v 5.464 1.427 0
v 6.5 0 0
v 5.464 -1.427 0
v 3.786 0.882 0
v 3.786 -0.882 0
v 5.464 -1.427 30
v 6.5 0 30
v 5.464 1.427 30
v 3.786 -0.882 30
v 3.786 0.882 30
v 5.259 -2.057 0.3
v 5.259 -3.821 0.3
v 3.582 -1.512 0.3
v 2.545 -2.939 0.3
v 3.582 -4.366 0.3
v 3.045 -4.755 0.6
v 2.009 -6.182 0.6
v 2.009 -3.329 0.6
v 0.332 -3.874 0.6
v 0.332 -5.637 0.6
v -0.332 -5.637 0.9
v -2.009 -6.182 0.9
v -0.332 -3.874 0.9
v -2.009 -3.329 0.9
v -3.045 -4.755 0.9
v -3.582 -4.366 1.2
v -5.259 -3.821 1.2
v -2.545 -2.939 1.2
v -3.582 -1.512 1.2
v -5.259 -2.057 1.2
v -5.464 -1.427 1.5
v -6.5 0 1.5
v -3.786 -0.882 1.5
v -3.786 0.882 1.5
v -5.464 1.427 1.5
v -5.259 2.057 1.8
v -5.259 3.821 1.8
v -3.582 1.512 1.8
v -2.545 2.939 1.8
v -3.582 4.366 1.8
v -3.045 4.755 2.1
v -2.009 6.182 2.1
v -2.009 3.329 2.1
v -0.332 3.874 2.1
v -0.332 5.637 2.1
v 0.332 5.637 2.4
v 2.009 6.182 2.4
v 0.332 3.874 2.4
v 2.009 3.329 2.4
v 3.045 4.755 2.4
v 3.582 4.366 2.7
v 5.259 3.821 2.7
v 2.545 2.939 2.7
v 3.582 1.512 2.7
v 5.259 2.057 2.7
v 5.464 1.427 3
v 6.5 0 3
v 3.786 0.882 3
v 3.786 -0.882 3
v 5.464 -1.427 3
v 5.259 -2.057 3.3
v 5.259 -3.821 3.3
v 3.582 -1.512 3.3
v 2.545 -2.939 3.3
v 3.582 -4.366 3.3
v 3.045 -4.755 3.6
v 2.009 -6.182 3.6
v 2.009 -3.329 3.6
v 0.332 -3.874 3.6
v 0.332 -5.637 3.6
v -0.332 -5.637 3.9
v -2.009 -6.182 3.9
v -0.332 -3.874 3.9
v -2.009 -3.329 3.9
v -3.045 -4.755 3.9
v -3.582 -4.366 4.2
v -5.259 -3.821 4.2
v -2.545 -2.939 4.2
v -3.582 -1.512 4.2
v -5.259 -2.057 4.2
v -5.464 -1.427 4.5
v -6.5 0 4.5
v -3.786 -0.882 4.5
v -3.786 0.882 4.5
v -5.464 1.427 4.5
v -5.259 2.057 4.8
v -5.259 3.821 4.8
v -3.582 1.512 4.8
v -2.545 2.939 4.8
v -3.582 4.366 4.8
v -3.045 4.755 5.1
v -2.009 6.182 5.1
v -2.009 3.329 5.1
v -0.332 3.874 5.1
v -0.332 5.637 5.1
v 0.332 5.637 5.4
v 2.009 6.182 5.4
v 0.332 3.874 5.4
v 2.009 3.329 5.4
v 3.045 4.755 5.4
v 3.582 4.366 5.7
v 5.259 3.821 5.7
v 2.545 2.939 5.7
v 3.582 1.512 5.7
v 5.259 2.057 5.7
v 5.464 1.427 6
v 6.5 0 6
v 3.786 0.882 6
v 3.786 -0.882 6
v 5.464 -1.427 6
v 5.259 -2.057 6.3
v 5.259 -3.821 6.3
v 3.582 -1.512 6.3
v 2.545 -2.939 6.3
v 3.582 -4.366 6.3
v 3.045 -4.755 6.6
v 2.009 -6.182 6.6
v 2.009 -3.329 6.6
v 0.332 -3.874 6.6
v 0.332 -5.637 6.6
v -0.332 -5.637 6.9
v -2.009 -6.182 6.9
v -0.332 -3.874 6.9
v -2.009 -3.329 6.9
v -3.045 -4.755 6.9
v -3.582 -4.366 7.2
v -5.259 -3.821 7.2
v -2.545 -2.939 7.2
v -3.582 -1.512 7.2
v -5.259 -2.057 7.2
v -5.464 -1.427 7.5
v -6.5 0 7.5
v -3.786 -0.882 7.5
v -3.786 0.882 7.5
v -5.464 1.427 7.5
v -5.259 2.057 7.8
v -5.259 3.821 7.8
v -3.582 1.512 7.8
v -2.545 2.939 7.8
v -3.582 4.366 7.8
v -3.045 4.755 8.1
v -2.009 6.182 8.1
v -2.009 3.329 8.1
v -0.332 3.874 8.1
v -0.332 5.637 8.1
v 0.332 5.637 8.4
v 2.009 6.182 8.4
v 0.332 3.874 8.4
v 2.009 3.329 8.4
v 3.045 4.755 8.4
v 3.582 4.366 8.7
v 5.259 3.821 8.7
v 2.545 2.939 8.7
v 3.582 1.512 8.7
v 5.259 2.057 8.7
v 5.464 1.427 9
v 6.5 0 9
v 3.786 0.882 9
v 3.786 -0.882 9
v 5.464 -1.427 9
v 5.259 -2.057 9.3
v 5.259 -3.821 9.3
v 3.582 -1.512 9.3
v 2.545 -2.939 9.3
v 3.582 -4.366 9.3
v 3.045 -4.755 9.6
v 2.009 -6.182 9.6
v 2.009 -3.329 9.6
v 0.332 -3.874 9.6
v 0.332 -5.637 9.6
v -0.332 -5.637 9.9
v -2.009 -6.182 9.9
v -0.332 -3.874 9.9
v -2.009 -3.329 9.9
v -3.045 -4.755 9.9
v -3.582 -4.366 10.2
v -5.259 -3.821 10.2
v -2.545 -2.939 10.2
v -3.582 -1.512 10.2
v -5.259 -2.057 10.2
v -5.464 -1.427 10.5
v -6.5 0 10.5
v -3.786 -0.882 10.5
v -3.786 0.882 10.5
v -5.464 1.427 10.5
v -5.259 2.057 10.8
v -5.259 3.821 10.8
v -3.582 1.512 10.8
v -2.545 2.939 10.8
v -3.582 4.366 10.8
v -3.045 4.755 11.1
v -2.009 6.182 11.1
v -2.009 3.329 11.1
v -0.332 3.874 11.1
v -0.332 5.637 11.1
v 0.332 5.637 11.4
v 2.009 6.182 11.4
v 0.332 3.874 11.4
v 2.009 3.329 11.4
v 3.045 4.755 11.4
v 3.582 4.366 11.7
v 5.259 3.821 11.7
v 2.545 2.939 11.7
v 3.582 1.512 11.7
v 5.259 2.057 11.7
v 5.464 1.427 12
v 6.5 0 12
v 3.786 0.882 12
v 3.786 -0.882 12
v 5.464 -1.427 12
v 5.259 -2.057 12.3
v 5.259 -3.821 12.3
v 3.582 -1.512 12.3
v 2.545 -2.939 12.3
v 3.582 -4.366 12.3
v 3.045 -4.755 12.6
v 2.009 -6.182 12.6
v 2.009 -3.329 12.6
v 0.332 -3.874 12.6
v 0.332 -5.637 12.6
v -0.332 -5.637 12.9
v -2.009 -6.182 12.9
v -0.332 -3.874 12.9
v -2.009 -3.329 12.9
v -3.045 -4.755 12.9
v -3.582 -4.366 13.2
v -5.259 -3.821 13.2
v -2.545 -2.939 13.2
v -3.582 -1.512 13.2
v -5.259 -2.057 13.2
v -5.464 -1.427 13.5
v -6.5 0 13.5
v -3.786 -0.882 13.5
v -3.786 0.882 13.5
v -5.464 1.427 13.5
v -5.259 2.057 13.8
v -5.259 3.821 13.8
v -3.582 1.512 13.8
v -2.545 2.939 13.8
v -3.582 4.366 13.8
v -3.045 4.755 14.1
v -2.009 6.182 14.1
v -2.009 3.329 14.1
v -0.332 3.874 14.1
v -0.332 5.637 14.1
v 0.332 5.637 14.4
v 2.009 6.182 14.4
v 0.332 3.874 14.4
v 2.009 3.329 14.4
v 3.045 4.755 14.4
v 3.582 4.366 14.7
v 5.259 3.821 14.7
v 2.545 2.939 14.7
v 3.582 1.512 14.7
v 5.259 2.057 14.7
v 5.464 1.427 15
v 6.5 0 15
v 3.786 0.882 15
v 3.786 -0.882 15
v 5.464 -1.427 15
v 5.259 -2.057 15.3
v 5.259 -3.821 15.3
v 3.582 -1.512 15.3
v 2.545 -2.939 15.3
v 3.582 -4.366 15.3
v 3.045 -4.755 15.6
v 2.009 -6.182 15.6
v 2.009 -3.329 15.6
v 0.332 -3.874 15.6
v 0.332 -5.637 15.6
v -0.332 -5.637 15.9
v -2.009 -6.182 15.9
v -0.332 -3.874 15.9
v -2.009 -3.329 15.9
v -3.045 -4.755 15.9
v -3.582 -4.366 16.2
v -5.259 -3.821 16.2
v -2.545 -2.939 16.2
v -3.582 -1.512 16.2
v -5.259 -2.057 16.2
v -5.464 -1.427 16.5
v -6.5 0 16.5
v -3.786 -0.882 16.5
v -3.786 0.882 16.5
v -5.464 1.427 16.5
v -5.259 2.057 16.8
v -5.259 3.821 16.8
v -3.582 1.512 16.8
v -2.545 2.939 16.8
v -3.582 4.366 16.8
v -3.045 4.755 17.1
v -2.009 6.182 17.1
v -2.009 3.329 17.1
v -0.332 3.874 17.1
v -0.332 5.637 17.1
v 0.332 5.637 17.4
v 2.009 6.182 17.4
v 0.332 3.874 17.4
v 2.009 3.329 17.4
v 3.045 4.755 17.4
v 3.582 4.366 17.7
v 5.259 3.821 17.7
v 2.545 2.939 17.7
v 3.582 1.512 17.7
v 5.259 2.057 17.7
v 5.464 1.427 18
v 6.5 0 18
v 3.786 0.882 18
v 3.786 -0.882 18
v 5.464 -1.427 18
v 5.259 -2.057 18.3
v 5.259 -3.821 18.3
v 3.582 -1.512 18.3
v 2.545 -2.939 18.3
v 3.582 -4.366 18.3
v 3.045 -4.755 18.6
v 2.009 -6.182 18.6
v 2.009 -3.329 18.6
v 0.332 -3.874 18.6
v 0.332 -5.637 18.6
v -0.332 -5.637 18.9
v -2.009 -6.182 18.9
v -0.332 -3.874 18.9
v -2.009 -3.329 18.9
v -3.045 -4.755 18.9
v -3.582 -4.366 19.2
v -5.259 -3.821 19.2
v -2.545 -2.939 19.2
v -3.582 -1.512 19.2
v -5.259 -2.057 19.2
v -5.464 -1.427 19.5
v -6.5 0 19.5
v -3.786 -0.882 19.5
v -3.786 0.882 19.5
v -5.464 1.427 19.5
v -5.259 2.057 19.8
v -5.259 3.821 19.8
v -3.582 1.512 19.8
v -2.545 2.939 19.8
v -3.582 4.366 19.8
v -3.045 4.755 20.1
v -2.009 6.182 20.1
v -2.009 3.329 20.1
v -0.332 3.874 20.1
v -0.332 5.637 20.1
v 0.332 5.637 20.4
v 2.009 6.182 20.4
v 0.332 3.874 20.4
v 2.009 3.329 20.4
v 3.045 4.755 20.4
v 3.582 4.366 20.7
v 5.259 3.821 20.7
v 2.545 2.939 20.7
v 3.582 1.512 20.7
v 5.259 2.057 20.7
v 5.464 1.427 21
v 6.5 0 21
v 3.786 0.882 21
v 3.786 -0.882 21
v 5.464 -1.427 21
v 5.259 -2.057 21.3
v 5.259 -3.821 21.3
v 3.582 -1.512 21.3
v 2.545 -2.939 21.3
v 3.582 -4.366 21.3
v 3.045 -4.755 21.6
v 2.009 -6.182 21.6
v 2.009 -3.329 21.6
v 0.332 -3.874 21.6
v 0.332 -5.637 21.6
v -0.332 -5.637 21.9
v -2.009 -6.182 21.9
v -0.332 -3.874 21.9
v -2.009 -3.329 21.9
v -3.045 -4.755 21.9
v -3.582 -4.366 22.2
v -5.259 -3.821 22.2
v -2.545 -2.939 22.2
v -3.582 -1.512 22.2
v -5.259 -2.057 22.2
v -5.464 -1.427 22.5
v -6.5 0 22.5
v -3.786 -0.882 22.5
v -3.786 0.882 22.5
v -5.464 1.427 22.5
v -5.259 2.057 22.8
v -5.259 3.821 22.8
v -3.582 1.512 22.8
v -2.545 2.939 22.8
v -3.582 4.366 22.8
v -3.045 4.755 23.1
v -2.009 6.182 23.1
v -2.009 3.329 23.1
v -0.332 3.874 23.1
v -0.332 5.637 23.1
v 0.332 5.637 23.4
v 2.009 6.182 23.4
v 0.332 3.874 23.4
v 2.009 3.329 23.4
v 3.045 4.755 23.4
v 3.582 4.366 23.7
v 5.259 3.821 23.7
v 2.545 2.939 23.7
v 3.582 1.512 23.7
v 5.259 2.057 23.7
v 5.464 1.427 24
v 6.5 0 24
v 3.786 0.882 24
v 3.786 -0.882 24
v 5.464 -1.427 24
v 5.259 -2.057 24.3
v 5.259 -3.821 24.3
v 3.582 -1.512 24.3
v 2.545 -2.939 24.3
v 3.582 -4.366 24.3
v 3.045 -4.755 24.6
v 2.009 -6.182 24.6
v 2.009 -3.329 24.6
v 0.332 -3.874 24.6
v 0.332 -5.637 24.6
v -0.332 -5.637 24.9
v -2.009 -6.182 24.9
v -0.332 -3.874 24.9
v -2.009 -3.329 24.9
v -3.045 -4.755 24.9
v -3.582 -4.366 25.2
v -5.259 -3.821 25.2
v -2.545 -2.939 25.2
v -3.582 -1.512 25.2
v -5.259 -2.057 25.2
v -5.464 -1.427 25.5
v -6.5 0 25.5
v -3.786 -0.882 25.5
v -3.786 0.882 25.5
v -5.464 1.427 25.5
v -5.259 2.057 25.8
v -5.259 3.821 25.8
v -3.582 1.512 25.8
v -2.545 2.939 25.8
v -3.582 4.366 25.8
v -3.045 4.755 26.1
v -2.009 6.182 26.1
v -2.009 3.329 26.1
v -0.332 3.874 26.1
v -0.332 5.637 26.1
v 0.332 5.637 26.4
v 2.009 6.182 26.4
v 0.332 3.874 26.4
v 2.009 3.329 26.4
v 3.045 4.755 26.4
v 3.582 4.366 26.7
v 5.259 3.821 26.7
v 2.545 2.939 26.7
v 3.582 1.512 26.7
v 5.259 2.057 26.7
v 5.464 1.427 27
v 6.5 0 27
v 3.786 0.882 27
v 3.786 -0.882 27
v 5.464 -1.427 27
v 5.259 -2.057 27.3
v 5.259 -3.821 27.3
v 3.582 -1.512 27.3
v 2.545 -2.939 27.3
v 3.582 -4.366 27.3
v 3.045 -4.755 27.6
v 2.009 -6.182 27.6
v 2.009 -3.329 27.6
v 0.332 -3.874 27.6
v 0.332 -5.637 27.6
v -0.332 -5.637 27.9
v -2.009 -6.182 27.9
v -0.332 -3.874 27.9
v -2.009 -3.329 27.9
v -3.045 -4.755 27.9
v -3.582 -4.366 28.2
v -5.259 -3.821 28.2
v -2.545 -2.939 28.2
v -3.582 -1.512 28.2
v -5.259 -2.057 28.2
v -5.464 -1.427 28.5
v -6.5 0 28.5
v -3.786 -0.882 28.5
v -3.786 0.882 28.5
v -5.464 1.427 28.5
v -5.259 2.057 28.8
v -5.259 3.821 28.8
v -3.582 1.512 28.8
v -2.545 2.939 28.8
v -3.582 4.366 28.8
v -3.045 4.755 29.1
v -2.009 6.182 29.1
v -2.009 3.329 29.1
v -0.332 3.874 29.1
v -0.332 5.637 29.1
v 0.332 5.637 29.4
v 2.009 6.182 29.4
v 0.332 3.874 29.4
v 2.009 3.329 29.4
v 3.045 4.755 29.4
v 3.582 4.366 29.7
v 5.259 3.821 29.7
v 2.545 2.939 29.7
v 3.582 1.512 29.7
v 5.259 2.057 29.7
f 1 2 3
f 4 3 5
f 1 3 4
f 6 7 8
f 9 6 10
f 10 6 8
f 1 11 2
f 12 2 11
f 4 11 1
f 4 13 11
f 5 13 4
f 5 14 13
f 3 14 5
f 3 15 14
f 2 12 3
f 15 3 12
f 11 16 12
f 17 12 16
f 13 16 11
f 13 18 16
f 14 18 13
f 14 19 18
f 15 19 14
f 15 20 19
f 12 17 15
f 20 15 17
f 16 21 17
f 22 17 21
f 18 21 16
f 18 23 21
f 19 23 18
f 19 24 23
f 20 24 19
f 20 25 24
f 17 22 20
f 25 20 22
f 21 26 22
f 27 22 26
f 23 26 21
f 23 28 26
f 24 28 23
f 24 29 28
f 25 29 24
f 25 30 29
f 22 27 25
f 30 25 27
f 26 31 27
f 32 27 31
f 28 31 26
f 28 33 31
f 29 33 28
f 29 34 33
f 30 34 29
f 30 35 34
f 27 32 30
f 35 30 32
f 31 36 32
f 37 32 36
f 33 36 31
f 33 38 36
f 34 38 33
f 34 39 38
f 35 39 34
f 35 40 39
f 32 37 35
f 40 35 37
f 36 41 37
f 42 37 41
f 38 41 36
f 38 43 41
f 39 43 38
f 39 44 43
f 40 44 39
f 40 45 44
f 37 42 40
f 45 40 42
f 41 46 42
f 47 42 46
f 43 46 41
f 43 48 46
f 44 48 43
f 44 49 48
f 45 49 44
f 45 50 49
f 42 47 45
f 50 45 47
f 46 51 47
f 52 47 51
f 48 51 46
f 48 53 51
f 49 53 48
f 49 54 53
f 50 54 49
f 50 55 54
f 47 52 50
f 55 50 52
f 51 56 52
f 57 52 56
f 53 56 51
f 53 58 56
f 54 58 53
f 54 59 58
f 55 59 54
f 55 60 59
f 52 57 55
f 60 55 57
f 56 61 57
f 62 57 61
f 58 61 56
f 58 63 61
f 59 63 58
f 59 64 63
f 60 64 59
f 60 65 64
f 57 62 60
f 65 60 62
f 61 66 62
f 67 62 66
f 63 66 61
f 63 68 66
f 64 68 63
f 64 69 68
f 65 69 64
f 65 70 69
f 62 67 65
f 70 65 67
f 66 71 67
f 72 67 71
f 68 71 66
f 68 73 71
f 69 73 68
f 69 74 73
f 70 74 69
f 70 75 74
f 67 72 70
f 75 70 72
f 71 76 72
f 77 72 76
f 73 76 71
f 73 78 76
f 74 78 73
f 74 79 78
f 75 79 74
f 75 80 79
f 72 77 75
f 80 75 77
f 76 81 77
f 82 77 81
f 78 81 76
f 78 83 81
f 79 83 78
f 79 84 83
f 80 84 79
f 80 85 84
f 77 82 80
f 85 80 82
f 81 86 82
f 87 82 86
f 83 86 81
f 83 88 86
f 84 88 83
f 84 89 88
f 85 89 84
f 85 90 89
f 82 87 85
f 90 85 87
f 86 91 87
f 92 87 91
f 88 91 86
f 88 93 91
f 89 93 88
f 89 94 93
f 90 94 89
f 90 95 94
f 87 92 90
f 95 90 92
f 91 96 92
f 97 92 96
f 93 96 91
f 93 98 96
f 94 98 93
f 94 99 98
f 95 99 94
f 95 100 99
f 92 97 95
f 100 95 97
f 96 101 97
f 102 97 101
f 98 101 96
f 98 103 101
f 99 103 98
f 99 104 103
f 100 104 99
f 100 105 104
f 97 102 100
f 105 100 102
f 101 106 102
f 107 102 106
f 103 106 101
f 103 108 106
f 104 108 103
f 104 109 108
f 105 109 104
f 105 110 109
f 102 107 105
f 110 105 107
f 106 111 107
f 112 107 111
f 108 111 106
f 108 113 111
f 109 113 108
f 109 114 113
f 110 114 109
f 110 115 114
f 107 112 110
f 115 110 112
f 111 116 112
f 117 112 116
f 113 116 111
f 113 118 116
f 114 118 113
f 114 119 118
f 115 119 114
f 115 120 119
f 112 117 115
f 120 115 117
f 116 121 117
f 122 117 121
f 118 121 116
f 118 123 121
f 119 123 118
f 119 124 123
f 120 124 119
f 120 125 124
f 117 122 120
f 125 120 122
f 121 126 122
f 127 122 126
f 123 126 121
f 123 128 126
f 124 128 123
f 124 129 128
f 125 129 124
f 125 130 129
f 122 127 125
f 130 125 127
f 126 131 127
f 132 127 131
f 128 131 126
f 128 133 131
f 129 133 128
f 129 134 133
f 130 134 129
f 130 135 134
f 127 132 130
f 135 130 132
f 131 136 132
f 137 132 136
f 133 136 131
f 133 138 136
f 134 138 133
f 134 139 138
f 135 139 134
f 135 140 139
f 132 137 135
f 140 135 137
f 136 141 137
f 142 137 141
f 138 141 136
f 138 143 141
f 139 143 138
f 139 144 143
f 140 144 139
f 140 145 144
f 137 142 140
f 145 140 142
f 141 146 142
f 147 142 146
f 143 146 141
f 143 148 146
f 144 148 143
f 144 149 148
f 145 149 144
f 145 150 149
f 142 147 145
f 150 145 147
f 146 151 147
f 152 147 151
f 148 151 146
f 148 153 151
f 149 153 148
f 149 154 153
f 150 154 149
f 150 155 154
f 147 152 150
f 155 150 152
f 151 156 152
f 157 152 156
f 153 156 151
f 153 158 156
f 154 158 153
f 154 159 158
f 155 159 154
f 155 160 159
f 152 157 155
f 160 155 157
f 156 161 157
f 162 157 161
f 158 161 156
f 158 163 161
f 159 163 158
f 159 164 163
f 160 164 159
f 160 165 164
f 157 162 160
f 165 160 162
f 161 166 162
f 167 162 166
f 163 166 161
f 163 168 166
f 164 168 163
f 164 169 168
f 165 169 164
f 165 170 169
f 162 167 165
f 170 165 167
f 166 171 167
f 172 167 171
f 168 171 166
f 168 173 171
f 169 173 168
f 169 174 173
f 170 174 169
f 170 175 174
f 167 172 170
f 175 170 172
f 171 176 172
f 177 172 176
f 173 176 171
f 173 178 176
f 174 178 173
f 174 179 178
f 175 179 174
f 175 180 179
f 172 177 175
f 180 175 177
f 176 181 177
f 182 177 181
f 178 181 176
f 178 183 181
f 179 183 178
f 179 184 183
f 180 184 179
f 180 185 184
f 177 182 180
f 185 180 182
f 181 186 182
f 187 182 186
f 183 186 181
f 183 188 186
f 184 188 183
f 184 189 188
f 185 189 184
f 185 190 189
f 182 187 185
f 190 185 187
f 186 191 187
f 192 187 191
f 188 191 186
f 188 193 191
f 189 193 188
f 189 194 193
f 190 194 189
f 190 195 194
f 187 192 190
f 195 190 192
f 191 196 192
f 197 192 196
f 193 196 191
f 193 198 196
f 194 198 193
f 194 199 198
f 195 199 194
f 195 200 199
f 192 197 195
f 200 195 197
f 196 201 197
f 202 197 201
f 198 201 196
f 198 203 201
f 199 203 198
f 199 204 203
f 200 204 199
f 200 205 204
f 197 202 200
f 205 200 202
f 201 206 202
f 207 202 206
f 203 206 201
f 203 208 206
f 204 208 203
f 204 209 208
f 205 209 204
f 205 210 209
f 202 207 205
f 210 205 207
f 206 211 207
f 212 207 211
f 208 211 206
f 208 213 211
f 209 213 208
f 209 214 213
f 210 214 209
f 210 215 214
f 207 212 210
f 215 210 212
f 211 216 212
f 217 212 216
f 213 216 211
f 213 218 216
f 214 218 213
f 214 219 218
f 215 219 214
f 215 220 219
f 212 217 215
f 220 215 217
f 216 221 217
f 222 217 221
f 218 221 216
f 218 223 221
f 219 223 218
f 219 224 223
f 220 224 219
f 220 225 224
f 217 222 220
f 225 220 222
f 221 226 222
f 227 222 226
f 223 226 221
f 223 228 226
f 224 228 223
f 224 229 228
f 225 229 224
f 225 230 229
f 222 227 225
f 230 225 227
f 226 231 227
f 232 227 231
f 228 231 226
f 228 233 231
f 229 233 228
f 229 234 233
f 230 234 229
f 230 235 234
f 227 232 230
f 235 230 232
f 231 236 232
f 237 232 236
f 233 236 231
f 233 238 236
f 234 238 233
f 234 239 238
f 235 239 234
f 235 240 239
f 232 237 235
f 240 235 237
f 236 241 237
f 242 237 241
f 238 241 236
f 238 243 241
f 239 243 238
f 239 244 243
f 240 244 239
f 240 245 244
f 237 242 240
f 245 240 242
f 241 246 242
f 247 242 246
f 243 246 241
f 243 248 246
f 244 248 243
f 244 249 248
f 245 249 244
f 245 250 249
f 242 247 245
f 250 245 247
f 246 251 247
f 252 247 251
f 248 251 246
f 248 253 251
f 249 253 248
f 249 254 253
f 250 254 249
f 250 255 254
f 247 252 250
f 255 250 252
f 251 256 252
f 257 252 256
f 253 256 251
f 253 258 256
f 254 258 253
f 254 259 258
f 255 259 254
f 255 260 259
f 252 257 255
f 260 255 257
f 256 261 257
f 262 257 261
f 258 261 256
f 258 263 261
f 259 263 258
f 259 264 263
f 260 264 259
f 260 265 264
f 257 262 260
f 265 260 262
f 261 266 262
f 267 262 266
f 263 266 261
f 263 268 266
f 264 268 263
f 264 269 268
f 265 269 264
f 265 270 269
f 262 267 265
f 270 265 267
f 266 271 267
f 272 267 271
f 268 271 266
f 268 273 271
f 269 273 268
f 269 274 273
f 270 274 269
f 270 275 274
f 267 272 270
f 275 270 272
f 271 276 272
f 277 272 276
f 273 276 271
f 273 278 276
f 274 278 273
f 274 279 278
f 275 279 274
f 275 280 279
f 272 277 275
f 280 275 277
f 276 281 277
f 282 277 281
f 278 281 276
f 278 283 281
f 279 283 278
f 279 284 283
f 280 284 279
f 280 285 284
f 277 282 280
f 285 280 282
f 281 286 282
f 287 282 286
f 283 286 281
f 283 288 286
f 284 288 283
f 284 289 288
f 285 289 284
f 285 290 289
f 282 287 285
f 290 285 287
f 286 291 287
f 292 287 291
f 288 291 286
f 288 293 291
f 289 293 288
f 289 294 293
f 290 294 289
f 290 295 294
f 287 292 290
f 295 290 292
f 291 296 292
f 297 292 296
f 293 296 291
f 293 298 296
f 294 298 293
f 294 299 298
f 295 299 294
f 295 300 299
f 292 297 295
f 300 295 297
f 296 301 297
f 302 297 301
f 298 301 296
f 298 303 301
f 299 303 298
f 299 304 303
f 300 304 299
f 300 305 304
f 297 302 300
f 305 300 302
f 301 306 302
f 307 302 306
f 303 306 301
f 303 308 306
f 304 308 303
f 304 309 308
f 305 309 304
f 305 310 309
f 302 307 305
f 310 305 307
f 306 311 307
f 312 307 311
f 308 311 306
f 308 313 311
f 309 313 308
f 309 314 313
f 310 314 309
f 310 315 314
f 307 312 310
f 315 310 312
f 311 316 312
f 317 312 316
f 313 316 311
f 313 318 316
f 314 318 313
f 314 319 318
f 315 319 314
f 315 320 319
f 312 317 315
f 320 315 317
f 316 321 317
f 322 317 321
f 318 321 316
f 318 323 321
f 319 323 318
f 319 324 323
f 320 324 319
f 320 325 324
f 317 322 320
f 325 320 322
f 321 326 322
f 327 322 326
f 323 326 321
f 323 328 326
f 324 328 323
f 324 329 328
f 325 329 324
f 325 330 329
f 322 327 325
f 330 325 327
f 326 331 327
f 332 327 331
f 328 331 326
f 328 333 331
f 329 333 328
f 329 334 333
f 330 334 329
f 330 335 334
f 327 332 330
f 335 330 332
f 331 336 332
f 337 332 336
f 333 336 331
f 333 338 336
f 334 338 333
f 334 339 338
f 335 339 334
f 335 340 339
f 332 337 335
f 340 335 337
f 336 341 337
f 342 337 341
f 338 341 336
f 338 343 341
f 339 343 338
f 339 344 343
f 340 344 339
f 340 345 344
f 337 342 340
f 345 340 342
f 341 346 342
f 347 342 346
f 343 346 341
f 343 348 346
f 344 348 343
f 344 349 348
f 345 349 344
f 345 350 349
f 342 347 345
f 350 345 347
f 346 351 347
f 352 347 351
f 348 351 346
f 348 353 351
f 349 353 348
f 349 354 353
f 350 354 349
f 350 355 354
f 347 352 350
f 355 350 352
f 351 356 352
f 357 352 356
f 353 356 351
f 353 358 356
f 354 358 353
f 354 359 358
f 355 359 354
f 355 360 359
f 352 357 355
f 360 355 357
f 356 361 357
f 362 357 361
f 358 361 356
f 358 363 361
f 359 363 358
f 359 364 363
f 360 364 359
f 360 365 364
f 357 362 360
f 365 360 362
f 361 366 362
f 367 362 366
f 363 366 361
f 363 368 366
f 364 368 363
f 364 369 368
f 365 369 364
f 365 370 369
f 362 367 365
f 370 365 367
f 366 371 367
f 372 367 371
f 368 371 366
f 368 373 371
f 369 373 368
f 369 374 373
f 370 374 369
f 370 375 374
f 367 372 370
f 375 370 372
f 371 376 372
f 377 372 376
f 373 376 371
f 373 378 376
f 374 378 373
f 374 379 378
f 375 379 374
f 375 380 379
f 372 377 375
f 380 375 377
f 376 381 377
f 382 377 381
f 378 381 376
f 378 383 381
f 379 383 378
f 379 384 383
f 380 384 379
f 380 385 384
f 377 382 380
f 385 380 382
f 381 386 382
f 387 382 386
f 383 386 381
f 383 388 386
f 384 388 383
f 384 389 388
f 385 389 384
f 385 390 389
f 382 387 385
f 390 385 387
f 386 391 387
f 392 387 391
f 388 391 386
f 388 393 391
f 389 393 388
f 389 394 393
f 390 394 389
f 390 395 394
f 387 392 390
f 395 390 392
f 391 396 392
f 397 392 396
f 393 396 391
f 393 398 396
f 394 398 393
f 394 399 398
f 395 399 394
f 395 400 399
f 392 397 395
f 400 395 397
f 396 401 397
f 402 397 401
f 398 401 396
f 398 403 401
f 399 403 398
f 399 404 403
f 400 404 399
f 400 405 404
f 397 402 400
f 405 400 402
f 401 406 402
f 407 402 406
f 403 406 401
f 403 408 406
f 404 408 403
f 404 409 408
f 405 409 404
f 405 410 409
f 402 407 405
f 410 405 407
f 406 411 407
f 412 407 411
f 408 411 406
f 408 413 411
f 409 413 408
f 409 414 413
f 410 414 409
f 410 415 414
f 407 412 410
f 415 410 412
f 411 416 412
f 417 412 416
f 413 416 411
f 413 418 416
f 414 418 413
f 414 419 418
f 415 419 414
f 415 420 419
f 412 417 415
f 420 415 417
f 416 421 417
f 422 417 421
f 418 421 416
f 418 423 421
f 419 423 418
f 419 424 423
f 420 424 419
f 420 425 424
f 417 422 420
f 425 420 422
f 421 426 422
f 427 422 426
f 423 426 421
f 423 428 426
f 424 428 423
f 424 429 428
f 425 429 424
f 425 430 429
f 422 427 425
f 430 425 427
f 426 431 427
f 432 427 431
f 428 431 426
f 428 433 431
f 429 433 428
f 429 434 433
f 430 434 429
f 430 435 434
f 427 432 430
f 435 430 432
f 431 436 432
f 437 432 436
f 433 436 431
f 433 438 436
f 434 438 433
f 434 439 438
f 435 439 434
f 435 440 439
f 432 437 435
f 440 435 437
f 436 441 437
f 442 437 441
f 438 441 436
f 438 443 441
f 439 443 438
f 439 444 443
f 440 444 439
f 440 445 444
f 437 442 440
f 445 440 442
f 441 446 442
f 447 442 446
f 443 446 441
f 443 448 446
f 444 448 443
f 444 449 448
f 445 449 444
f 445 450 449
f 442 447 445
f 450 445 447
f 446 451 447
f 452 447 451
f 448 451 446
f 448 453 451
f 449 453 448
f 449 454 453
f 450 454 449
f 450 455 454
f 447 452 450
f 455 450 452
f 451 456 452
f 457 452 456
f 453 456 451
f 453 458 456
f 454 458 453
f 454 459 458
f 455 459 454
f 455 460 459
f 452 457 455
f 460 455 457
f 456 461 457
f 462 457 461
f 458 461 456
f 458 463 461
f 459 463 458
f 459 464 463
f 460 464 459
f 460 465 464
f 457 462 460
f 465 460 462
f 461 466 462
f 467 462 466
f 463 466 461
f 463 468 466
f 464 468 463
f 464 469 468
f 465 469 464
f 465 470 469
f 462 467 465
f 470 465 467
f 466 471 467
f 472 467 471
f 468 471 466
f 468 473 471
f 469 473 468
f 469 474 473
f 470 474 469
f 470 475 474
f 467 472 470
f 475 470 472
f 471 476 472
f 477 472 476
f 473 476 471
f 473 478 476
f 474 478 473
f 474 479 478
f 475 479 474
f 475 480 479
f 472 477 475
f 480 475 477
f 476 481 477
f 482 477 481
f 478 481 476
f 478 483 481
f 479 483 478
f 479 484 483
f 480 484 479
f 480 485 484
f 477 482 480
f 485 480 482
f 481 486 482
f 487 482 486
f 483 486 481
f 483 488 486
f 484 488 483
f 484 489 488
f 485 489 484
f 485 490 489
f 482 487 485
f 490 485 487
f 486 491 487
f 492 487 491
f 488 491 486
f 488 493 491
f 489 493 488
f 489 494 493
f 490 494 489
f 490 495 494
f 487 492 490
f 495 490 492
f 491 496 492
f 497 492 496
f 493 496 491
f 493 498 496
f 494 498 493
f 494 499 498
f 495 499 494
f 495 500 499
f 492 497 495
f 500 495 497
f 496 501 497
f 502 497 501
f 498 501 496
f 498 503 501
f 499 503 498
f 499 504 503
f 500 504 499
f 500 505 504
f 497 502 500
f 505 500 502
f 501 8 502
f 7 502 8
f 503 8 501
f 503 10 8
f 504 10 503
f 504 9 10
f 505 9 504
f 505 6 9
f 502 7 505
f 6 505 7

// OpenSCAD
// Author: Mihai Oltean, https://mihaioltean.github.io, mihai.oltean@gmail.com
// More details: https://jenny5.org, https://jenny5-robot.github.io/
// Source code: github.com/jenny5-robot
// MIT License
//--------------------------------------------------------------


module spring(inaltime, diametru, compresion)
{
  color ("DarkSlateGray")
  render(){ 
	  linear_extrude(height = inaltime, center = false, convexity = 10, twist = 360 * compresion, slices = 100)
		translate([diametru / 2, 0, 0])
			circle(r = 1.5);
   }
}
//---------------------------------------------------------------------------

spring(30, 10, 10);
